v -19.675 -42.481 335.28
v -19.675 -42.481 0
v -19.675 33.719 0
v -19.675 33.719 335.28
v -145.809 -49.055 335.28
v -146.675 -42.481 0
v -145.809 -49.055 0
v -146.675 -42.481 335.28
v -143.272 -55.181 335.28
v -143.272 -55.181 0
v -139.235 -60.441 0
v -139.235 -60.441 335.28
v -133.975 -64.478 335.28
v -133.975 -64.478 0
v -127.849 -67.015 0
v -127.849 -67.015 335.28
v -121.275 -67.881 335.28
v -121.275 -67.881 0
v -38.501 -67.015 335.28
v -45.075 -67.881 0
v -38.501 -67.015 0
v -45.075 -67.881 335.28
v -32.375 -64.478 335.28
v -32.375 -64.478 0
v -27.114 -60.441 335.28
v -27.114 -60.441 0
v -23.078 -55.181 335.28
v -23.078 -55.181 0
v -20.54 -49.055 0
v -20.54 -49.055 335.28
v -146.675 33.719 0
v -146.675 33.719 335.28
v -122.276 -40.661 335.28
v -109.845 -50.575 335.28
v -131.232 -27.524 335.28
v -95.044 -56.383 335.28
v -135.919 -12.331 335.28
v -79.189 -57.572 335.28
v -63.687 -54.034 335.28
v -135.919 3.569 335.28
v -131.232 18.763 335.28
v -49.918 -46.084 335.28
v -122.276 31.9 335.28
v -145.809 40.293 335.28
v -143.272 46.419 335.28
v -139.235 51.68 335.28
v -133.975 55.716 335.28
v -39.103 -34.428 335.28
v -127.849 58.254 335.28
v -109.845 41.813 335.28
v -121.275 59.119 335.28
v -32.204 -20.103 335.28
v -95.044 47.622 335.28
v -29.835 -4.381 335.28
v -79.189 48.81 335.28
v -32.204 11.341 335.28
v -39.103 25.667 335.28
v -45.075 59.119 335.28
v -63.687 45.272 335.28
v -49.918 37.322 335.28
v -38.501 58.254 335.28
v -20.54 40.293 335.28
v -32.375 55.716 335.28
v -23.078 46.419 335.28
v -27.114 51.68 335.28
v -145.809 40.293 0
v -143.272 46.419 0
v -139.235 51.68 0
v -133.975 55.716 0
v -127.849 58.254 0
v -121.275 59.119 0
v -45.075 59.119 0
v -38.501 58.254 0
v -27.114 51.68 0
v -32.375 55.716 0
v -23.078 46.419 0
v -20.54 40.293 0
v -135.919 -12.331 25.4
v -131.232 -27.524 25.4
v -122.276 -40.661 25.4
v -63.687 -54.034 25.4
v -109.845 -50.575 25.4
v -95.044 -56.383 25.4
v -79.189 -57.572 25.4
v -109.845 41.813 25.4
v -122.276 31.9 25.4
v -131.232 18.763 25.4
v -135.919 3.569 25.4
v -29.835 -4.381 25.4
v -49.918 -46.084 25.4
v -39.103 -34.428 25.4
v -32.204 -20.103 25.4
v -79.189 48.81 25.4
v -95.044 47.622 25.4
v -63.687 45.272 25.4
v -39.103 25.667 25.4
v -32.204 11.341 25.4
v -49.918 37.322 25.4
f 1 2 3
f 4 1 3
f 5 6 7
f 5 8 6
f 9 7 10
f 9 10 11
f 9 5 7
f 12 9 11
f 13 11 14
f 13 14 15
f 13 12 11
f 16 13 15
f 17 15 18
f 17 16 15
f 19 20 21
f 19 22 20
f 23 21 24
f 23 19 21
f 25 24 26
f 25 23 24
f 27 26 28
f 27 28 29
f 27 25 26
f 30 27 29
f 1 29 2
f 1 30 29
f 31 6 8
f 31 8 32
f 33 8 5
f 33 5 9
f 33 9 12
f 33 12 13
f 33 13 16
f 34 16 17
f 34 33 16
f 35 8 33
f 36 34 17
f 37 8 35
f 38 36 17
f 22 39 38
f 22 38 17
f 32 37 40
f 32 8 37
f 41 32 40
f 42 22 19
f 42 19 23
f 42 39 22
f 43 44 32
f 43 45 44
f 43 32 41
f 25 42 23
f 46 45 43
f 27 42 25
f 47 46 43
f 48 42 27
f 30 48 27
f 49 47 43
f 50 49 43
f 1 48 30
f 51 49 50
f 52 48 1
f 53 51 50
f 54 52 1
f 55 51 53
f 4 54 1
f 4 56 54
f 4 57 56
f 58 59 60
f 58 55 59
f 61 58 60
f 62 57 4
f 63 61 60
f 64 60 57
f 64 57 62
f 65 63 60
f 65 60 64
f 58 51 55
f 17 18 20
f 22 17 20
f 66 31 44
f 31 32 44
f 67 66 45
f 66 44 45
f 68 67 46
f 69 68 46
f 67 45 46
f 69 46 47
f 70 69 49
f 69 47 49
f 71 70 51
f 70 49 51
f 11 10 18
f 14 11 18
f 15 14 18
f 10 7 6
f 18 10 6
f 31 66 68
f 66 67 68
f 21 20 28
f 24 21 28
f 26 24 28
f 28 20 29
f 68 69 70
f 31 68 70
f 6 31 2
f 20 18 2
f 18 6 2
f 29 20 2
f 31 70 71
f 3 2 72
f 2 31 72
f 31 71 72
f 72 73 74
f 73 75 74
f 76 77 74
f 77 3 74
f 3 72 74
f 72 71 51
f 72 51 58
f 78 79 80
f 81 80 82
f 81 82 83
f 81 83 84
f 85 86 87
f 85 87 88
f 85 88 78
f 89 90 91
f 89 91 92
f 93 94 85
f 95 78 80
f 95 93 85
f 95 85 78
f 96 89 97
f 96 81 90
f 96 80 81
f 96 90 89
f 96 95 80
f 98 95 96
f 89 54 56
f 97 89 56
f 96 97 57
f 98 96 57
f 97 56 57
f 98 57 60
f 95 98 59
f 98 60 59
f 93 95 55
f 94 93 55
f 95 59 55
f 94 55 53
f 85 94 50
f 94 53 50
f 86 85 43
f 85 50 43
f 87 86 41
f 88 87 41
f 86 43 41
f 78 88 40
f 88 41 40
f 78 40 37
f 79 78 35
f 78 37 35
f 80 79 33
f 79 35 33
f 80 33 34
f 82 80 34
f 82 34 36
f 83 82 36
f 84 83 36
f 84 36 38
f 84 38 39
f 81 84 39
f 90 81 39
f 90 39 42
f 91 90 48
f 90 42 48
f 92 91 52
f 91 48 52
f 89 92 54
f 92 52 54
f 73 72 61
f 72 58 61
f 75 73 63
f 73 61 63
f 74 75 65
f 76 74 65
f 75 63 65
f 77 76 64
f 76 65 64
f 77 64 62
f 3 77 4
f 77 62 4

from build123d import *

# Parameters (mm, degrees)
F0_W     = 127
F0_H     = 127
F1_DEPTH = 335.28
F2_R     = 53.34
F3_DEPTH = 309.88
F4_R     = 25.4


with BuildPart() as f1:
    # F0 (on Top) → F1 (new body)
    with BuildSketch(Plane.XY):
        with Locations((-83.174668, -4.380767)):
            Rectangle(F0_W, F0_H)
    extrude(amount=F1_DEPTH)

    # F2 (on face) → F3 (cut)
    with BuildSketch(Plane.XY.offset(335.28)):
        with Locations((-83.174668, -4.380767)):
            Circle(F2_R)
    extrude(amount=-F3_DEPTH, mode=Mode.SUBTRACT)

    # F4
    f4_edges = [f1.edges().sort_by_distance(p)[0] for p in [
        (-19.674668, 59.119233, 167.64),
        (-146.674668, 59.119233, 167.64),
        (-146.674668, -67.880767, 167.64),
        (-19.674668, -67.880767, 167.64),
    ]]
    fillet(f4_edges, radius=F4_R)


solid = f1.part
